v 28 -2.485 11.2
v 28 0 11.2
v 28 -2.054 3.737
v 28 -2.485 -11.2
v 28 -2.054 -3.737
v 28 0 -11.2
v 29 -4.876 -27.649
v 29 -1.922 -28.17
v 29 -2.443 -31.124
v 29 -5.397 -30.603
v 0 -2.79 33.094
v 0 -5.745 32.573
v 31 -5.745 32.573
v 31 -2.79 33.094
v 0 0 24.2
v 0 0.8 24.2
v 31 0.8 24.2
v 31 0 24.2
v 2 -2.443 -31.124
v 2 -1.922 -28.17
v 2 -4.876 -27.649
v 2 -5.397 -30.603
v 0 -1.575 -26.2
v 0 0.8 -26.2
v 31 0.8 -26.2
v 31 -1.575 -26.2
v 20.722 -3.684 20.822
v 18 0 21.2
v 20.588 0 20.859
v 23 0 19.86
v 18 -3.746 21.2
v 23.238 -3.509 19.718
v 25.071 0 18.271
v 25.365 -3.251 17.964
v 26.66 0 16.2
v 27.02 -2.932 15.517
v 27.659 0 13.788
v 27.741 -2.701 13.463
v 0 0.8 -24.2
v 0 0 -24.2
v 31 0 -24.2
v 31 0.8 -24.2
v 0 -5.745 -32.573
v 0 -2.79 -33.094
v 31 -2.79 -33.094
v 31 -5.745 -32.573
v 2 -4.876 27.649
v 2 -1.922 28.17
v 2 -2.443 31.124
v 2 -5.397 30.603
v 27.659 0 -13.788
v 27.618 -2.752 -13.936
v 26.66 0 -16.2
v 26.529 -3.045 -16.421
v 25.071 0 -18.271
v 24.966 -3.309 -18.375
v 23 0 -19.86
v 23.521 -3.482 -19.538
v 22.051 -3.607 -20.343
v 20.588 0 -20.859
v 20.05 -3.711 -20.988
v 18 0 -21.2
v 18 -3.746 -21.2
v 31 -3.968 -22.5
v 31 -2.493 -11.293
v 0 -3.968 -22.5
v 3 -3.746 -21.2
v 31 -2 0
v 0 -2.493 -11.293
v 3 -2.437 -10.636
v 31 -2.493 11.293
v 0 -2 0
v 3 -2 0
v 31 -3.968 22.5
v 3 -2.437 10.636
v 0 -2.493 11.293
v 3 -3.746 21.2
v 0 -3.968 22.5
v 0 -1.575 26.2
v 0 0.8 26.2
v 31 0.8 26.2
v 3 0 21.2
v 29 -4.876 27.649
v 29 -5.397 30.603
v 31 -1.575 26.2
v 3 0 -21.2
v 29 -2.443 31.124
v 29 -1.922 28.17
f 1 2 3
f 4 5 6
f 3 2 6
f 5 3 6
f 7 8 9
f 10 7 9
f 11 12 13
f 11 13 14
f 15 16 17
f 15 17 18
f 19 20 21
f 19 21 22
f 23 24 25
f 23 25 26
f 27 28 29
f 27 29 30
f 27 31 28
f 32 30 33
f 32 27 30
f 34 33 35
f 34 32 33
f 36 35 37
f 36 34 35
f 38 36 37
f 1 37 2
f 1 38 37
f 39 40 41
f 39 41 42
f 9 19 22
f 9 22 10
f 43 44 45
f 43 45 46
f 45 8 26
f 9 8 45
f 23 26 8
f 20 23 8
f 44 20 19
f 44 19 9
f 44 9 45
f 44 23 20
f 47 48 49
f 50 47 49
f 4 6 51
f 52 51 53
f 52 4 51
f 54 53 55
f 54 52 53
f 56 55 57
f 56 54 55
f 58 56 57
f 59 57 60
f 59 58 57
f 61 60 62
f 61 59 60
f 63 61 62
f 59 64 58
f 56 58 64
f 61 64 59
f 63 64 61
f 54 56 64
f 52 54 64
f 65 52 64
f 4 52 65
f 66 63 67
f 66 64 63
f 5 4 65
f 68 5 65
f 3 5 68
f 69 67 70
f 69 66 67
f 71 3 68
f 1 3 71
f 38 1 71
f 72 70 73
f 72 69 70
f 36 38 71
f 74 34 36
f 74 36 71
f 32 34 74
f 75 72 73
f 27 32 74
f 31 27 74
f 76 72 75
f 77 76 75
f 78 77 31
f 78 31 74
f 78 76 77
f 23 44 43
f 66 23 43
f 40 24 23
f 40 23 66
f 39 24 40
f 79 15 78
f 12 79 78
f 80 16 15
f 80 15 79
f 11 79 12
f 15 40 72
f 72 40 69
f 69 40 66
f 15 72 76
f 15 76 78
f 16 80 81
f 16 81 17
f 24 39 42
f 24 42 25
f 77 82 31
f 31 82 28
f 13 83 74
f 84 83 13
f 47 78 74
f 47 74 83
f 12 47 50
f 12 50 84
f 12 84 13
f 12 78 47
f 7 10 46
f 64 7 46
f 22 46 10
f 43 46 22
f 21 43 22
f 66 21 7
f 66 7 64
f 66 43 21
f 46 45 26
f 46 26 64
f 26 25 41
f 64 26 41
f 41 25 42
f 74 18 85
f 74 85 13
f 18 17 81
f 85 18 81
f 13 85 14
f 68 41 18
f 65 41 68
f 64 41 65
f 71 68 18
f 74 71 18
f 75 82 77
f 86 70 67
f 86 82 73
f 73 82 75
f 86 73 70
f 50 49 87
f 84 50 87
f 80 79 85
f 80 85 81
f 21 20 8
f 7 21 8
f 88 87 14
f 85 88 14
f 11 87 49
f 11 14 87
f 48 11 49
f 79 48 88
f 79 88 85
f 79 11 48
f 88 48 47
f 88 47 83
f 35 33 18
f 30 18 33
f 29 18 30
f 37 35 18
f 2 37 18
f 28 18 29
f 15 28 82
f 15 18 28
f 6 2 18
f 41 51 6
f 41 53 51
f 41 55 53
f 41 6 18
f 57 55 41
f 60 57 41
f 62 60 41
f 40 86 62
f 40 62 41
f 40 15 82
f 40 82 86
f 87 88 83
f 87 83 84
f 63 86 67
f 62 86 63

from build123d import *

# Parameters (mm, degrees)
BOSS_EXTRUDE1_DEPTH = 31
SKETCH2_W           = 27
SKETCH2_H           = 3
CUT_EXTRUDE1_DEPTH  = 47.54655438
SKETCH3_W           = 25
SKETCH3_H           = 42.4
CUT_EXTRUDE2_DEPTH  = 46.707660351
FILLET1_R           = 10


with BuildPart() as part:
    # Sketch1 → Boss-Extrude1 (new body)
    with BuildSketch(Plane(origin=(0, 0, 0), x_dir=(0, 0, -1), z_dir=(1, 0, 0))):
        with BuildLine():
            Line((-24.2, 0), (24.2, 0))
            Line((24.2, 0), (24.2, 0.8))
            Line((24.2, 0.8), (26.2, 0.8))
            Line((26.2, 0.8), (26.2, -1.574624922))
            Line((26.2, -1.574624922), (33.093654271, -2.790162166))
            Line((33.093654271, -2.790162166), (32.572709738, -5.744585425))
            Line((32.572709738, -5.744585425), (22.5, -3.968494929))
            ThreePointArc((22.5, -3.968494929), (0, -2), (-22.5, -3.968494929))
            Line((-22.5, -3.968494929), (-32.572709738, -5.744585425))
            Line((-32.572709738, -5.744585425), (-33.093654271, -2.790162166))
            Line((-33.093654271, -2.790162166), (-26.2, -1.574624922))
            Line((-26.2, -1.574624922), (-26.2, 0.8))
            Line((-26.2, 0.8), (-24.2, 0.8))
            Line((-24.2, 0.8), (-24.2, 0))
        make_face()
    extrude(amount=BOSS_EXTRUDE1_DEPTH)

    # Sketch2 → Cut-Extrude1 (cut, through all)
    with BuildSketch(Plane(origin=(0, 2.953319706, -0.520749947), x_dir=(1, 0, 0), z_dir=(0, 0.9848077530122087, -0.17364817766692767))):
        with Locations((15.5, 29.575393877)):
            Rectangle(SKETCH2_W, SKETCH2_H)
    cut_extrude1 = extrude(amount=-CUT_EXTRUDE1_DEPTH, mode=Mode.SUBTRACT)

    # Mirror1: Cut-Extrude1 across plane
    add(cut_extrude1.mirror(Plane.XY), mode=Mode.SUBTRACT)

    # Sketch3 → Cut-Extrude2 (cut, through all)
    with BuildSketch(Plane(origin=(0, 0, 0), x_dir=(1, 0, 0), z_dir=(0, 1, 0))):
        with Locations((15.5, 0)):
            Rectangle(SKETCH3_W, SKETCH3_H)
    extrude(amount=-CUT_EXTRUDE2_DEPTH, mode=Mode.SUBTRACT)

    # Fillet1
    fillet1_edges = [part.edges().sort_by_distance(p)[0] for p in [
        (28, -1.873042869, -21.2),
        (28, -1.873042869, 21.2),
    ]]
    fillet(fillet1_edges, radius=FILLET1_R)


solid = part.part
